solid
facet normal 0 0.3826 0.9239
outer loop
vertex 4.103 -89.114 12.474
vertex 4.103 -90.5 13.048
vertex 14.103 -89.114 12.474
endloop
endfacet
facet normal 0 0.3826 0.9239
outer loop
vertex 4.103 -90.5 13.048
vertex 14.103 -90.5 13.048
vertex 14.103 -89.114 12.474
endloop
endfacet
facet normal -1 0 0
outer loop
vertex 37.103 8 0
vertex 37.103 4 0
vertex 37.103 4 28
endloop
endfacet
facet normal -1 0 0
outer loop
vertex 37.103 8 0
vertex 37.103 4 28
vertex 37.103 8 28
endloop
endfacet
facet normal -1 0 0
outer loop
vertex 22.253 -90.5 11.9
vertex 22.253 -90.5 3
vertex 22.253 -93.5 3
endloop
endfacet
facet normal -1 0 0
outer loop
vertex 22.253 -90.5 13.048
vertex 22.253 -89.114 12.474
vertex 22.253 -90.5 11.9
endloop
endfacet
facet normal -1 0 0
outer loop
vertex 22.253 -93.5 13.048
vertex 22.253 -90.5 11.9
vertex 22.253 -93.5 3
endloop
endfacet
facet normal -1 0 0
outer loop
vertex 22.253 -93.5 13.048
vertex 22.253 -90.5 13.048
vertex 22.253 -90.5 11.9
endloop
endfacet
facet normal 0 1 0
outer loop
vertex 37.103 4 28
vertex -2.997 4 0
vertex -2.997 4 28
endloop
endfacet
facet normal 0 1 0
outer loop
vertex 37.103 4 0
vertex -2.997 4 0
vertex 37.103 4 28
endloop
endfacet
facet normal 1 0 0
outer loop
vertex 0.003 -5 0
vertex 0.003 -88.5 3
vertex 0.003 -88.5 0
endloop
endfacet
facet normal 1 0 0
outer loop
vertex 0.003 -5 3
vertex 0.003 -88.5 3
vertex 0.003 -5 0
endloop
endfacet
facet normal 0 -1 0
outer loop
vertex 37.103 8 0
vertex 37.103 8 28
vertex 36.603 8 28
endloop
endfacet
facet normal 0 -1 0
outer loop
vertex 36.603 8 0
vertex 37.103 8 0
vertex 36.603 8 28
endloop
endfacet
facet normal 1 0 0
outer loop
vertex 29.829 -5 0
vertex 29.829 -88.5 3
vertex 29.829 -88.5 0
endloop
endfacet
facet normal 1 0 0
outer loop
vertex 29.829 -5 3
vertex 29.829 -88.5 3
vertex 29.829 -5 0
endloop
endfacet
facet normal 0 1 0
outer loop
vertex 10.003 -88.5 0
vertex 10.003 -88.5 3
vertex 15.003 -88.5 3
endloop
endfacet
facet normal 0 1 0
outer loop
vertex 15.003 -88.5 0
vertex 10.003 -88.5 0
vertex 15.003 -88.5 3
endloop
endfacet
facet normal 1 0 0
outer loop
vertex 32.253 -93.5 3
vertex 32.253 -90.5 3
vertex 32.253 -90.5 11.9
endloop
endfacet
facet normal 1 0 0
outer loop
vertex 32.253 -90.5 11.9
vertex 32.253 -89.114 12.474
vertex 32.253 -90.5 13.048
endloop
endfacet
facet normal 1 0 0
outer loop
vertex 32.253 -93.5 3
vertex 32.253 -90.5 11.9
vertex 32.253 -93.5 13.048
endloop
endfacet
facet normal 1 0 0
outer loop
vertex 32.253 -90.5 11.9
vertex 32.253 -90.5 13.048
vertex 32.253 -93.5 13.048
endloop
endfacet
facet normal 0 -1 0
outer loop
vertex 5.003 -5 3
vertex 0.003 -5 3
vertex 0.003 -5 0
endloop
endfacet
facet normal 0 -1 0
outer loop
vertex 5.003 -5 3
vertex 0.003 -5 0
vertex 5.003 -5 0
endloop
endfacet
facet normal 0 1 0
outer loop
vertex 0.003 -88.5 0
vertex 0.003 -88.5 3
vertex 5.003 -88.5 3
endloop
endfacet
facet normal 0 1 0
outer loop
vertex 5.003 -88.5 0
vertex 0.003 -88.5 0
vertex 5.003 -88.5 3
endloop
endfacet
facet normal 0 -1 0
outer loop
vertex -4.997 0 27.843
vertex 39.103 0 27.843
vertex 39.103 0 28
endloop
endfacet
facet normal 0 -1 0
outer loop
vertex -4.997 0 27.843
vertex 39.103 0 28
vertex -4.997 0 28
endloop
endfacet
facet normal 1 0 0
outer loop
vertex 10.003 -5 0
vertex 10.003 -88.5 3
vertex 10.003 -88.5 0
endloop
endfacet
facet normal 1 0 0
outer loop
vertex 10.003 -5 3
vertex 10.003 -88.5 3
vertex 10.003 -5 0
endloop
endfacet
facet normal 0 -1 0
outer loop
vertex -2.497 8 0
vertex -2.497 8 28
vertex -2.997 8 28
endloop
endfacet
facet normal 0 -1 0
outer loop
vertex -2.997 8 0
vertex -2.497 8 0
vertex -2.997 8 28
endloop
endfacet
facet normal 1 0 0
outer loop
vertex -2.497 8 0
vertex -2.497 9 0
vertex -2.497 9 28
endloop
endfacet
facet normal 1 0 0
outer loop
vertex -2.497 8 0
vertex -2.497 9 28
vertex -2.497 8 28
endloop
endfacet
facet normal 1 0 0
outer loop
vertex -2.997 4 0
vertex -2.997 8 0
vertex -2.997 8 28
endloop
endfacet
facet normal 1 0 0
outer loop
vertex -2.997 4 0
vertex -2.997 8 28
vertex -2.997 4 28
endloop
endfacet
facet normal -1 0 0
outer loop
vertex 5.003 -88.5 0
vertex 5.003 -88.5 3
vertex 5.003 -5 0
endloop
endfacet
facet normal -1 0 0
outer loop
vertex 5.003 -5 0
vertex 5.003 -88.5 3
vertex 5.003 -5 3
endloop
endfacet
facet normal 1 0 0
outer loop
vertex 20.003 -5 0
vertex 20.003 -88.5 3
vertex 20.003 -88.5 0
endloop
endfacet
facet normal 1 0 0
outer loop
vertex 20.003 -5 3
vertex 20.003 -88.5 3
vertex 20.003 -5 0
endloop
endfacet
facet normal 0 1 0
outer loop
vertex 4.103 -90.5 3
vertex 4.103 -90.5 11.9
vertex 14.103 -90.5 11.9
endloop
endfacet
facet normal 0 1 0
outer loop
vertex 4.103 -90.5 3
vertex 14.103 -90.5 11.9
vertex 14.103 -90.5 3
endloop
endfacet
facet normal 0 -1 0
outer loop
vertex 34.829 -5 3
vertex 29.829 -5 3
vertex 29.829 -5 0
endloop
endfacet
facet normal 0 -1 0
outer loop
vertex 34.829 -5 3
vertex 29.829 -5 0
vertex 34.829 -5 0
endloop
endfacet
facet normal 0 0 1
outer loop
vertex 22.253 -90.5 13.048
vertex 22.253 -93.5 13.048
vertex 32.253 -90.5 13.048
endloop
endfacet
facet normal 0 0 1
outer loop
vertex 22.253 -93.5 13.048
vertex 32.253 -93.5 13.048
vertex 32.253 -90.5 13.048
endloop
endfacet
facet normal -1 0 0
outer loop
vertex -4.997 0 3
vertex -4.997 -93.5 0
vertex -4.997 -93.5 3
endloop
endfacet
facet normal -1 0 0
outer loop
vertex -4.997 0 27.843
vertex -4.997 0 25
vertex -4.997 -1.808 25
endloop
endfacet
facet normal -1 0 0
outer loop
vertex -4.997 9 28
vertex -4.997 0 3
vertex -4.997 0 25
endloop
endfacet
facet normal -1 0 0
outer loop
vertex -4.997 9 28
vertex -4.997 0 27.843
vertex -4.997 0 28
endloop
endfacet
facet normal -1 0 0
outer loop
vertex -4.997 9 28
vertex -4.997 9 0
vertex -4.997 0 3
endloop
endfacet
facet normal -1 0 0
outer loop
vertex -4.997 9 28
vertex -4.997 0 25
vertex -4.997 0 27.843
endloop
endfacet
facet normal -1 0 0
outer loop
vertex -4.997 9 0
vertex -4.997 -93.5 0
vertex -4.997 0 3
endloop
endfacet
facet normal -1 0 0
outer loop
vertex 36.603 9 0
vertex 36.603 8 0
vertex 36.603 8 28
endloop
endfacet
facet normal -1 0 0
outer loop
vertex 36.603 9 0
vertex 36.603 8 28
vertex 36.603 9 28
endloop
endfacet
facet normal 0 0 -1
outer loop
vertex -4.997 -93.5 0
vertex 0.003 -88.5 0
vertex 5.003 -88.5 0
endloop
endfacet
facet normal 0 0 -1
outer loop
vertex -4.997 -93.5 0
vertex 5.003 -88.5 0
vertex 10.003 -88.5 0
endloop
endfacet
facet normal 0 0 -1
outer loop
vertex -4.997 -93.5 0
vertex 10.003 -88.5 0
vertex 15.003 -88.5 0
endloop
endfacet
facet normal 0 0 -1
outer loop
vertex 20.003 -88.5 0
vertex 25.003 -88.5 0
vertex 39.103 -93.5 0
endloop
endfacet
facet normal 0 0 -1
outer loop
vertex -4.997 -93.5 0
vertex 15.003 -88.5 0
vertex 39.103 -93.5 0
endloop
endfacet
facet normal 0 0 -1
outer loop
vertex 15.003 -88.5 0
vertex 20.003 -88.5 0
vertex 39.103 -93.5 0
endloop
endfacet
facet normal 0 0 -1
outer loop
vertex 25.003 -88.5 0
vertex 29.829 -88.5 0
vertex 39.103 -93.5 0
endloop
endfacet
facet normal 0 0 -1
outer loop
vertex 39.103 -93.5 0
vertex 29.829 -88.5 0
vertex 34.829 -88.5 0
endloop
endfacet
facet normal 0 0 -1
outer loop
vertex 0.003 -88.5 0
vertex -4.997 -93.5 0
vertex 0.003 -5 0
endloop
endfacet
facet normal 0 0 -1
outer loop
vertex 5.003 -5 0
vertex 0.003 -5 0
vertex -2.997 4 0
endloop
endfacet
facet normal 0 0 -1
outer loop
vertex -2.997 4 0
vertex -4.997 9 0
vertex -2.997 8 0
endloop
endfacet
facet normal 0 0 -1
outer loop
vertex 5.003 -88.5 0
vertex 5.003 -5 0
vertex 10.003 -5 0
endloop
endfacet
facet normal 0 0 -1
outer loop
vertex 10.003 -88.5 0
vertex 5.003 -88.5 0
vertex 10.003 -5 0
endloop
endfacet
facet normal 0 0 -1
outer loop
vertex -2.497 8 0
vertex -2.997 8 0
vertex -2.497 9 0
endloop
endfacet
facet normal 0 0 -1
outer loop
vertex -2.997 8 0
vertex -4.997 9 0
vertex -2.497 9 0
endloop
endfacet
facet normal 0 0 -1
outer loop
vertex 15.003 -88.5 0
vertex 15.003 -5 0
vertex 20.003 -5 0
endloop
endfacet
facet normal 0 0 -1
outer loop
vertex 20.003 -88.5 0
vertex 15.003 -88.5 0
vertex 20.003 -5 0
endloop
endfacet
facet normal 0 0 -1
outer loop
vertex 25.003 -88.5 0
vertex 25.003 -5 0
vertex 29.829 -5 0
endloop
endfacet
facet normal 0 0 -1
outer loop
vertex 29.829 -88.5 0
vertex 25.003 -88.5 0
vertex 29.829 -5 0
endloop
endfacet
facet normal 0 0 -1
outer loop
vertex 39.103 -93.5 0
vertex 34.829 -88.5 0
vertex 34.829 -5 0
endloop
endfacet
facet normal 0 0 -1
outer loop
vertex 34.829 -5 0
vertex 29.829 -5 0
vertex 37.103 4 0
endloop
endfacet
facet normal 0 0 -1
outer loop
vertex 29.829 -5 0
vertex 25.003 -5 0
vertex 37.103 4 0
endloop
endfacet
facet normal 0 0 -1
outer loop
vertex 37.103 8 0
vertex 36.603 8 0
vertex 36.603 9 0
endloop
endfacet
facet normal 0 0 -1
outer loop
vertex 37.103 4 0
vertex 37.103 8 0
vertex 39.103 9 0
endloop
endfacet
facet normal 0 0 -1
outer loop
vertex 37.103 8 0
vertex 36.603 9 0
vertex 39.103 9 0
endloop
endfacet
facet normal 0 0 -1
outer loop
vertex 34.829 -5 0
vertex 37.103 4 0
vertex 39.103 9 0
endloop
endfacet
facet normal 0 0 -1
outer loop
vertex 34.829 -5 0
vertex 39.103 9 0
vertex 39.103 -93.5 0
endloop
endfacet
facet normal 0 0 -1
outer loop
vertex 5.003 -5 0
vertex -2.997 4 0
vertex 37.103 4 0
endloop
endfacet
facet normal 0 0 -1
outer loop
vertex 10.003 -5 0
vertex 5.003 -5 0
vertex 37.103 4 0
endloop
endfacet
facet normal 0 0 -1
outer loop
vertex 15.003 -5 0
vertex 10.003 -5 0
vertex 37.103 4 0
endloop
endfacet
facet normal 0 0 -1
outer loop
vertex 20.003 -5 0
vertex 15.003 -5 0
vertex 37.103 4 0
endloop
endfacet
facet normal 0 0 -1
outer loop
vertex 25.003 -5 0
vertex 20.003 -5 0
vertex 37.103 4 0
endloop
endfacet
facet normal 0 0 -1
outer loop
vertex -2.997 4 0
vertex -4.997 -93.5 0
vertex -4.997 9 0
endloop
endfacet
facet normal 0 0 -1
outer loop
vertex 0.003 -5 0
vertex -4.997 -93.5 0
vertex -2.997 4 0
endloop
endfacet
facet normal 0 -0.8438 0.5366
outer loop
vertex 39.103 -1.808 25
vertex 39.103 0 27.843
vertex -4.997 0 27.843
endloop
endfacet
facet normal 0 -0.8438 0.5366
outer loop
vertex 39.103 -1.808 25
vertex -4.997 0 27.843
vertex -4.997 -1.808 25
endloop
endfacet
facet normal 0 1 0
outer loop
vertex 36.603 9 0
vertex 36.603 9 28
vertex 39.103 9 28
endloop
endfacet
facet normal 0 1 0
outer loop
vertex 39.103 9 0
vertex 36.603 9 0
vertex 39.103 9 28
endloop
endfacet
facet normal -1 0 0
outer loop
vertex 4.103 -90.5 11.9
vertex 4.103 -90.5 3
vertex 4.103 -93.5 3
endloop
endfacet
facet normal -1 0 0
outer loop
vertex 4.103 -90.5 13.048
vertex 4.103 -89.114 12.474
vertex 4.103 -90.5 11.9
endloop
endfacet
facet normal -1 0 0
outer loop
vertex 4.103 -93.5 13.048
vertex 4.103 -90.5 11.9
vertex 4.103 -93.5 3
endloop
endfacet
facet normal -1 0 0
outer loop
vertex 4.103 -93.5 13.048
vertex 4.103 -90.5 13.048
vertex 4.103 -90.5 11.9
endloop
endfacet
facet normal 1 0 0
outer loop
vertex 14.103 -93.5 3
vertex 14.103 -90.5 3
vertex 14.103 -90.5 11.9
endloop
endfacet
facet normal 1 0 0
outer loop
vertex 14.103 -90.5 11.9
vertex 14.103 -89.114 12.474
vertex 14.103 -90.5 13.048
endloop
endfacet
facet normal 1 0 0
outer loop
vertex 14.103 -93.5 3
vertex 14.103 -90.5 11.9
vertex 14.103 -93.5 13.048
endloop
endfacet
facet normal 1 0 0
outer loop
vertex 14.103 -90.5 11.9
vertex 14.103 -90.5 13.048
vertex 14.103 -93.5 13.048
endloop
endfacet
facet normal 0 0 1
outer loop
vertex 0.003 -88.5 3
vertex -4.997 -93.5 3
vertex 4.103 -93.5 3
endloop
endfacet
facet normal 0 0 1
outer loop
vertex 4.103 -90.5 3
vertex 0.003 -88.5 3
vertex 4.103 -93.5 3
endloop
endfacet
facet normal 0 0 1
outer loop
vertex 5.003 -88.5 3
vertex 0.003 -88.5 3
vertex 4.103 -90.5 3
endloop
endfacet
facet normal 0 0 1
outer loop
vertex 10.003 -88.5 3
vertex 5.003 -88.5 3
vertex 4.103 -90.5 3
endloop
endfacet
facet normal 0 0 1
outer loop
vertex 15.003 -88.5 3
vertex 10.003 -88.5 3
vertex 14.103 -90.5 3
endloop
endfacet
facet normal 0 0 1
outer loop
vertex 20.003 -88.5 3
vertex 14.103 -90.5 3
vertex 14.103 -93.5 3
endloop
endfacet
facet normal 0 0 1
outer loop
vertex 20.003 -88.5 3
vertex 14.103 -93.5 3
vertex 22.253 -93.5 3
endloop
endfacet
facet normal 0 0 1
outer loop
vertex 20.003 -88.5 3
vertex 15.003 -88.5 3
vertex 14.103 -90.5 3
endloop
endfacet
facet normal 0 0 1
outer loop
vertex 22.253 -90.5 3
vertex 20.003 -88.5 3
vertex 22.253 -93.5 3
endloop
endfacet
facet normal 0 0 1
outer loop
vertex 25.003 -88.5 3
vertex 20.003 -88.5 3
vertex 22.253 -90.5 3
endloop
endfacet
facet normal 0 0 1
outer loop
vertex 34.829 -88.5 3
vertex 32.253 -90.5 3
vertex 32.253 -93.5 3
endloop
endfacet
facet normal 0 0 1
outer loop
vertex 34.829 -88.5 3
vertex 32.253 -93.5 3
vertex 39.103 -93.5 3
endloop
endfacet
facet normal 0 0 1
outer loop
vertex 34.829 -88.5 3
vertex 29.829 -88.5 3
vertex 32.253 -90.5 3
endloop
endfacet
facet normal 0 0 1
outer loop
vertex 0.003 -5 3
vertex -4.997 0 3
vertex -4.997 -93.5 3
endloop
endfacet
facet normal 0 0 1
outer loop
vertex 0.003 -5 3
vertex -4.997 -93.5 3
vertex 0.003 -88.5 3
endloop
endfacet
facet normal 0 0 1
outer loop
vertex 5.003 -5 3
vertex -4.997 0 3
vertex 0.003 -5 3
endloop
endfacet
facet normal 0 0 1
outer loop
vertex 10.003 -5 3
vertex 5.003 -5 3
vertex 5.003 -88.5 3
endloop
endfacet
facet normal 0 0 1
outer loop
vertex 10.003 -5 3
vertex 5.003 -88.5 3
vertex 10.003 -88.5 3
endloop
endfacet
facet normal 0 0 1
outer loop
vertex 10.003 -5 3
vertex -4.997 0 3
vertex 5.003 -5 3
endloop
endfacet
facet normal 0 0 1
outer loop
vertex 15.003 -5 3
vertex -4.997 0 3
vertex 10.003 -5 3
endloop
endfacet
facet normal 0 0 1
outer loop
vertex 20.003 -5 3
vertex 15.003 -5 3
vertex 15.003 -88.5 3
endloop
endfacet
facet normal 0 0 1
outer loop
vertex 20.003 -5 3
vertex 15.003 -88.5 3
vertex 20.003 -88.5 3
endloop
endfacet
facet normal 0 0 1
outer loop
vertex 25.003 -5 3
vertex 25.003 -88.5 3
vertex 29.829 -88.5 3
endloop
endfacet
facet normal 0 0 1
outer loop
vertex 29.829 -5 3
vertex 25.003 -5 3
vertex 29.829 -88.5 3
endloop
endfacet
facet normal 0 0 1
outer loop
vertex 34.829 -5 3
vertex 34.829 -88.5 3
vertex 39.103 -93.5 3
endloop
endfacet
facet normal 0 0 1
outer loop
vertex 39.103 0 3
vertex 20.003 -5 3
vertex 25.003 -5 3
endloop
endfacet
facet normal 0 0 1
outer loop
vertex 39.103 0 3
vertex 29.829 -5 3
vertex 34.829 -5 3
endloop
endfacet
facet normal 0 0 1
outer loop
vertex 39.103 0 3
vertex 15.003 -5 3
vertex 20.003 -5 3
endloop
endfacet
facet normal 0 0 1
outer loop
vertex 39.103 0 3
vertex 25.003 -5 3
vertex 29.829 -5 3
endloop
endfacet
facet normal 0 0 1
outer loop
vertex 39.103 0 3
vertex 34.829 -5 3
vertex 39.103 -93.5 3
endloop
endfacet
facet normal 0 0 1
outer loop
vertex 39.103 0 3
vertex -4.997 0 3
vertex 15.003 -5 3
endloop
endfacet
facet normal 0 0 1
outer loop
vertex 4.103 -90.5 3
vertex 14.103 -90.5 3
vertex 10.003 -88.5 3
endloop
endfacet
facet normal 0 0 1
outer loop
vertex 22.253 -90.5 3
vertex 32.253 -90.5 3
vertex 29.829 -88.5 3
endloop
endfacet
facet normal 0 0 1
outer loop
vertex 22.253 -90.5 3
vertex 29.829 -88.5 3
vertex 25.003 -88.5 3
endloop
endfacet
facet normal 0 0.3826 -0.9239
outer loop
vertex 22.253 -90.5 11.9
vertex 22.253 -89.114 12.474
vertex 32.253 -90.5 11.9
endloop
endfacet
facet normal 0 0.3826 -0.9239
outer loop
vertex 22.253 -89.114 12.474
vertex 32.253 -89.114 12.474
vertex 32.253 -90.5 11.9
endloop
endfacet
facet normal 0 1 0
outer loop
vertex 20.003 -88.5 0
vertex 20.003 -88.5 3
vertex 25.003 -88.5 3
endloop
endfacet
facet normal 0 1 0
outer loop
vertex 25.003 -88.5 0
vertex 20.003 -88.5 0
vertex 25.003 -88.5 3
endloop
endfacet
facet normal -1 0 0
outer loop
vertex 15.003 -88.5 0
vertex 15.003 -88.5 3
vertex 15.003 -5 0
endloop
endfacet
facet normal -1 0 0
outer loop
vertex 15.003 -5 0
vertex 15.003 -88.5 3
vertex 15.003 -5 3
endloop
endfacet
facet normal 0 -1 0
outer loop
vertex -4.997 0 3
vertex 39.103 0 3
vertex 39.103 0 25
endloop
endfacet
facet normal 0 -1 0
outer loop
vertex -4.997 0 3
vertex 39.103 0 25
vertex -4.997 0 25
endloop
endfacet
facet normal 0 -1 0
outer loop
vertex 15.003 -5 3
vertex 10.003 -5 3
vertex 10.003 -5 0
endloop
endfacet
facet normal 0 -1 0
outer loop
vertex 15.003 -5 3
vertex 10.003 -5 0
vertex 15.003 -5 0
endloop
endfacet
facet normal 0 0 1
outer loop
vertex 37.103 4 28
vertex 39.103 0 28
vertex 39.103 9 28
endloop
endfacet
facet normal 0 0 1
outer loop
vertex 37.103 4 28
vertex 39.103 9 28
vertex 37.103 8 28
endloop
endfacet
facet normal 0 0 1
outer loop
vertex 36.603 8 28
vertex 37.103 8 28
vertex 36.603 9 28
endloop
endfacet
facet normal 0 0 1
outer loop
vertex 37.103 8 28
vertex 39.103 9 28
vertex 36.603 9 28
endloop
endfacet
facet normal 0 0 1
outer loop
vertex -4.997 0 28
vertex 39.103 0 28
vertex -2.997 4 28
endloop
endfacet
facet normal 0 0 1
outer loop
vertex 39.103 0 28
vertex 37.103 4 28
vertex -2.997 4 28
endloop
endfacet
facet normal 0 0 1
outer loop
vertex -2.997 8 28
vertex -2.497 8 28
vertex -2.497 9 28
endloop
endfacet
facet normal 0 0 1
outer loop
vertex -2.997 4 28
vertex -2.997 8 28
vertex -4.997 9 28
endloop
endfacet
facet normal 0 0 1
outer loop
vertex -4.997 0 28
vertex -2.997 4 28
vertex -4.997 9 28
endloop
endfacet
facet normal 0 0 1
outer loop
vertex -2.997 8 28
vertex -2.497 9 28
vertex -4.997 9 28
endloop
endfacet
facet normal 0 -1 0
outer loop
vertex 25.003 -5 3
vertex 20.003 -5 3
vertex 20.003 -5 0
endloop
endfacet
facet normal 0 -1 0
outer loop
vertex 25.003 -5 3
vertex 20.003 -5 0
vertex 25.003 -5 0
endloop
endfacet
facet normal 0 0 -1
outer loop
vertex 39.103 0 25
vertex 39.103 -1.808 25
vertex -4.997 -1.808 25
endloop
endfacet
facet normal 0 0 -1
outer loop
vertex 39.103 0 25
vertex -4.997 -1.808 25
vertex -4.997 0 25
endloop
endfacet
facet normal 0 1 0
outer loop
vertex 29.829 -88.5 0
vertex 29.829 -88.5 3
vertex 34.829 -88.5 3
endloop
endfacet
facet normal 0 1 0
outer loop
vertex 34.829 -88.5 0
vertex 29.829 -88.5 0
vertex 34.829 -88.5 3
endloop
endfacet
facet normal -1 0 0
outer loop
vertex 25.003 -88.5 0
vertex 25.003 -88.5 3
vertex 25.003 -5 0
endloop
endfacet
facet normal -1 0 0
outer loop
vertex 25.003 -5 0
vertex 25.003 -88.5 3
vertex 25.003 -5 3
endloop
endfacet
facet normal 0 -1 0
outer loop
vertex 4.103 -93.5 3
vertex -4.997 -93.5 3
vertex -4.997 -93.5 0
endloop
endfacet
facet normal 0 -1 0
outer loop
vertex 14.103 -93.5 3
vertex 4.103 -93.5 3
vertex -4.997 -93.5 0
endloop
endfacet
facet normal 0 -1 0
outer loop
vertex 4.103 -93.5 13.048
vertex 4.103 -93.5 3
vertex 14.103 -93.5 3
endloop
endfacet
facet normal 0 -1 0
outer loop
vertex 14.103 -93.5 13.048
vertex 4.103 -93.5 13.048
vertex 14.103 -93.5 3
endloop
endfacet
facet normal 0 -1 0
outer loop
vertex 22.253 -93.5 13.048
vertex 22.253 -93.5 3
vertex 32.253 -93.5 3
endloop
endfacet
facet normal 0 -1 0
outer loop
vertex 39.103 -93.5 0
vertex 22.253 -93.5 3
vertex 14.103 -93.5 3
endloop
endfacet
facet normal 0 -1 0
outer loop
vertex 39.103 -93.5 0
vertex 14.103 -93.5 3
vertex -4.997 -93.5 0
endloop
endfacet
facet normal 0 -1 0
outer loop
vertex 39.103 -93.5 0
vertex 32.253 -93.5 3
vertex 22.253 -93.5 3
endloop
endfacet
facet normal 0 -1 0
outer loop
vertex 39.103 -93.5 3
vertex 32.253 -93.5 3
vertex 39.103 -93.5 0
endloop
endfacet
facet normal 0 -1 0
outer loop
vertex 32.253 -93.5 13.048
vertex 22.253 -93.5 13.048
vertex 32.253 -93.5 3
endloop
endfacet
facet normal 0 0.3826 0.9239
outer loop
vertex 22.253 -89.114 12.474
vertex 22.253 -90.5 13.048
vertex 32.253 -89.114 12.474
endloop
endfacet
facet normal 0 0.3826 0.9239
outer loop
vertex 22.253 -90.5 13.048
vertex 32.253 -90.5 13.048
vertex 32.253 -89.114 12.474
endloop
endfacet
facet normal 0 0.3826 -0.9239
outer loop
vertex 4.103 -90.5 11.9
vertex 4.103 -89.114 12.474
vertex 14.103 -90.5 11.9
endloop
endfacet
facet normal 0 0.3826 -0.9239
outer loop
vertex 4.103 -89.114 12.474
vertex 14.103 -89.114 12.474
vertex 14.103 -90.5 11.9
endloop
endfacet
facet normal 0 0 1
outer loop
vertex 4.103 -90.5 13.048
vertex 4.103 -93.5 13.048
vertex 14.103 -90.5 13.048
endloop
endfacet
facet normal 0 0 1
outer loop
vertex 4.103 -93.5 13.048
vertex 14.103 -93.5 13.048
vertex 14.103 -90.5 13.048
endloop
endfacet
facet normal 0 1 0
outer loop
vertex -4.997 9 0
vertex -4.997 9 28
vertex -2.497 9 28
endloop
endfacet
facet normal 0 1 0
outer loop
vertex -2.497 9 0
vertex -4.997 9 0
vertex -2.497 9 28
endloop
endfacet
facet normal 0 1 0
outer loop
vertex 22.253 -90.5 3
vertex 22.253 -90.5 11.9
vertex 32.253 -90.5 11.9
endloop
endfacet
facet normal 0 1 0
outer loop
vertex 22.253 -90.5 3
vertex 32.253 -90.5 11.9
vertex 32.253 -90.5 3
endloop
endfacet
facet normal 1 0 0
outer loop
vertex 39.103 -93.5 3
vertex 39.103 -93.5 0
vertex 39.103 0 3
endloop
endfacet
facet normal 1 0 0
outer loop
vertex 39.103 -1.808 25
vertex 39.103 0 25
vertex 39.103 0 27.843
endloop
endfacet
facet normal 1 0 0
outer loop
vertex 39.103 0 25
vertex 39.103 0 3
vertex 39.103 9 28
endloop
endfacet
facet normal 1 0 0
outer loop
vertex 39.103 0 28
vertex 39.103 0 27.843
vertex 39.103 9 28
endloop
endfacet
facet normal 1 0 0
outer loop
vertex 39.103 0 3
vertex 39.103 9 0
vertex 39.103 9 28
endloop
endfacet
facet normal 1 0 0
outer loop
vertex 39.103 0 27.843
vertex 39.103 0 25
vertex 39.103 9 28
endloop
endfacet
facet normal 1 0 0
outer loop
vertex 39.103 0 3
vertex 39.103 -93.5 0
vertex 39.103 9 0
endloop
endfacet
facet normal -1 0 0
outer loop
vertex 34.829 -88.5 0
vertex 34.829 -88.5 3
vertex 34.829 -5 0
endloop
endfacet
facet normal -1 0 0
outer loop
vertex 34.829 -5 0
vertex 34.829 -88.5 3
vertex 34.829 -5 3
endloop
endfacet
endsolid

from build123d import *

# Parameters (mm, degrees)
PAD_DEPTH    = 28
SKETCH002_W  = 44.1
SKETCH002_H  = 3
PAD001_DEPTH = 93.5
PAD002_DEPTH = 5
PAD003_DEPTH = 5
PAD004_DEPTH = 44.1
SKETCH006_W  = 5
SKETCH006_H  = 83.5
POCKET_DEPTH = 5


with BuildPart() as part:
    # Sketch → Pad (new body)
    with BuildSketch(Plane.XY):
        Polygon((-4.997332, 9), (-2.497332, 9), (-2.497332, 8), (-2.997332, 8), (-2.997332, 4), (37.102668, 4), (37.102668, 8), (36.602668, 8), (36.602668, 9), (39.102668, 9), (39.102668, 0), (-4.997332, 0), (-4.997332, 4), align=None)
    extrude(amount=PAD_DEPTH)

    # Sketch002 (on Face11 of Pad) → Pad001 (join)
    with BuildSketch(Plane.XZ):
        with Locations((17.052668, 1.5)):
            Rectangle(SKETCH002_W, SKETCH002_H)
    extrude(amount=PAD001_DEPTH)

    # Sketch003 (on Face18 of Pad001) → Pad002 (join, symmetric)
    with BuildSketch(Plane.YZ.offset(9.102668)):
        Polygon((-93.5, 2.9), (-93.5, 13.04805), (-90.5, 13.04805), (-89.114181, 12.474025), (-90.5, 11.9), (-90.5, 2.9), align=None)
    extrude(amount=PAD002_DEPTH, both=True)

    # Sketch004 (on Face18 of Pad001) → Pad003 (join, symmetric)
    with BuildSketch(Plane.YZ.offset(27.252668)):
        Polygon((-93.5, 2.9), (-93.5, 13.04805), (-90.5, 13.04805), (-89.114181, 12.474025), (-90.5, 11.9), (-90.5, 2.9), align=None)
    extrude(amount=PAD003_DEPTH, both=True)

    # Sketch005 (on Face14 of Pad003) → Pad004 (join)
    with BuildSketch(Plane.YZ.offset(39.102668)):
        Polygon((0.1, 28), (-1.807951, 25), (0.1, 25), align=None)
    extrude(amount=-PAD004_DEPTH)

    # Sketch006 (on Face26 of Pad004) → Pocket (cut)
    with BuildSketch(Plane.XY.offset(3)):
        with Locations((32.328745, -46.75)):
            Rectangle(SKETCH006_W, SKETCH006_H)
        with Locations((2.502668, -46.75)):
            Rectangle(SKETCH006_W, SKETCH006_H)
        with Locations((12.502668, -46.75)):
            Rectangle(SKETCH006_W, SKETCH006_H)
        with Locations((22.502668, -46.75)):
            Rectangle(SKETCH006_W, SKETCH006_H)
    extrude(amount=-POCKET_DEPTH, mode=Mode.SUBTRACT)


solid = part.part
